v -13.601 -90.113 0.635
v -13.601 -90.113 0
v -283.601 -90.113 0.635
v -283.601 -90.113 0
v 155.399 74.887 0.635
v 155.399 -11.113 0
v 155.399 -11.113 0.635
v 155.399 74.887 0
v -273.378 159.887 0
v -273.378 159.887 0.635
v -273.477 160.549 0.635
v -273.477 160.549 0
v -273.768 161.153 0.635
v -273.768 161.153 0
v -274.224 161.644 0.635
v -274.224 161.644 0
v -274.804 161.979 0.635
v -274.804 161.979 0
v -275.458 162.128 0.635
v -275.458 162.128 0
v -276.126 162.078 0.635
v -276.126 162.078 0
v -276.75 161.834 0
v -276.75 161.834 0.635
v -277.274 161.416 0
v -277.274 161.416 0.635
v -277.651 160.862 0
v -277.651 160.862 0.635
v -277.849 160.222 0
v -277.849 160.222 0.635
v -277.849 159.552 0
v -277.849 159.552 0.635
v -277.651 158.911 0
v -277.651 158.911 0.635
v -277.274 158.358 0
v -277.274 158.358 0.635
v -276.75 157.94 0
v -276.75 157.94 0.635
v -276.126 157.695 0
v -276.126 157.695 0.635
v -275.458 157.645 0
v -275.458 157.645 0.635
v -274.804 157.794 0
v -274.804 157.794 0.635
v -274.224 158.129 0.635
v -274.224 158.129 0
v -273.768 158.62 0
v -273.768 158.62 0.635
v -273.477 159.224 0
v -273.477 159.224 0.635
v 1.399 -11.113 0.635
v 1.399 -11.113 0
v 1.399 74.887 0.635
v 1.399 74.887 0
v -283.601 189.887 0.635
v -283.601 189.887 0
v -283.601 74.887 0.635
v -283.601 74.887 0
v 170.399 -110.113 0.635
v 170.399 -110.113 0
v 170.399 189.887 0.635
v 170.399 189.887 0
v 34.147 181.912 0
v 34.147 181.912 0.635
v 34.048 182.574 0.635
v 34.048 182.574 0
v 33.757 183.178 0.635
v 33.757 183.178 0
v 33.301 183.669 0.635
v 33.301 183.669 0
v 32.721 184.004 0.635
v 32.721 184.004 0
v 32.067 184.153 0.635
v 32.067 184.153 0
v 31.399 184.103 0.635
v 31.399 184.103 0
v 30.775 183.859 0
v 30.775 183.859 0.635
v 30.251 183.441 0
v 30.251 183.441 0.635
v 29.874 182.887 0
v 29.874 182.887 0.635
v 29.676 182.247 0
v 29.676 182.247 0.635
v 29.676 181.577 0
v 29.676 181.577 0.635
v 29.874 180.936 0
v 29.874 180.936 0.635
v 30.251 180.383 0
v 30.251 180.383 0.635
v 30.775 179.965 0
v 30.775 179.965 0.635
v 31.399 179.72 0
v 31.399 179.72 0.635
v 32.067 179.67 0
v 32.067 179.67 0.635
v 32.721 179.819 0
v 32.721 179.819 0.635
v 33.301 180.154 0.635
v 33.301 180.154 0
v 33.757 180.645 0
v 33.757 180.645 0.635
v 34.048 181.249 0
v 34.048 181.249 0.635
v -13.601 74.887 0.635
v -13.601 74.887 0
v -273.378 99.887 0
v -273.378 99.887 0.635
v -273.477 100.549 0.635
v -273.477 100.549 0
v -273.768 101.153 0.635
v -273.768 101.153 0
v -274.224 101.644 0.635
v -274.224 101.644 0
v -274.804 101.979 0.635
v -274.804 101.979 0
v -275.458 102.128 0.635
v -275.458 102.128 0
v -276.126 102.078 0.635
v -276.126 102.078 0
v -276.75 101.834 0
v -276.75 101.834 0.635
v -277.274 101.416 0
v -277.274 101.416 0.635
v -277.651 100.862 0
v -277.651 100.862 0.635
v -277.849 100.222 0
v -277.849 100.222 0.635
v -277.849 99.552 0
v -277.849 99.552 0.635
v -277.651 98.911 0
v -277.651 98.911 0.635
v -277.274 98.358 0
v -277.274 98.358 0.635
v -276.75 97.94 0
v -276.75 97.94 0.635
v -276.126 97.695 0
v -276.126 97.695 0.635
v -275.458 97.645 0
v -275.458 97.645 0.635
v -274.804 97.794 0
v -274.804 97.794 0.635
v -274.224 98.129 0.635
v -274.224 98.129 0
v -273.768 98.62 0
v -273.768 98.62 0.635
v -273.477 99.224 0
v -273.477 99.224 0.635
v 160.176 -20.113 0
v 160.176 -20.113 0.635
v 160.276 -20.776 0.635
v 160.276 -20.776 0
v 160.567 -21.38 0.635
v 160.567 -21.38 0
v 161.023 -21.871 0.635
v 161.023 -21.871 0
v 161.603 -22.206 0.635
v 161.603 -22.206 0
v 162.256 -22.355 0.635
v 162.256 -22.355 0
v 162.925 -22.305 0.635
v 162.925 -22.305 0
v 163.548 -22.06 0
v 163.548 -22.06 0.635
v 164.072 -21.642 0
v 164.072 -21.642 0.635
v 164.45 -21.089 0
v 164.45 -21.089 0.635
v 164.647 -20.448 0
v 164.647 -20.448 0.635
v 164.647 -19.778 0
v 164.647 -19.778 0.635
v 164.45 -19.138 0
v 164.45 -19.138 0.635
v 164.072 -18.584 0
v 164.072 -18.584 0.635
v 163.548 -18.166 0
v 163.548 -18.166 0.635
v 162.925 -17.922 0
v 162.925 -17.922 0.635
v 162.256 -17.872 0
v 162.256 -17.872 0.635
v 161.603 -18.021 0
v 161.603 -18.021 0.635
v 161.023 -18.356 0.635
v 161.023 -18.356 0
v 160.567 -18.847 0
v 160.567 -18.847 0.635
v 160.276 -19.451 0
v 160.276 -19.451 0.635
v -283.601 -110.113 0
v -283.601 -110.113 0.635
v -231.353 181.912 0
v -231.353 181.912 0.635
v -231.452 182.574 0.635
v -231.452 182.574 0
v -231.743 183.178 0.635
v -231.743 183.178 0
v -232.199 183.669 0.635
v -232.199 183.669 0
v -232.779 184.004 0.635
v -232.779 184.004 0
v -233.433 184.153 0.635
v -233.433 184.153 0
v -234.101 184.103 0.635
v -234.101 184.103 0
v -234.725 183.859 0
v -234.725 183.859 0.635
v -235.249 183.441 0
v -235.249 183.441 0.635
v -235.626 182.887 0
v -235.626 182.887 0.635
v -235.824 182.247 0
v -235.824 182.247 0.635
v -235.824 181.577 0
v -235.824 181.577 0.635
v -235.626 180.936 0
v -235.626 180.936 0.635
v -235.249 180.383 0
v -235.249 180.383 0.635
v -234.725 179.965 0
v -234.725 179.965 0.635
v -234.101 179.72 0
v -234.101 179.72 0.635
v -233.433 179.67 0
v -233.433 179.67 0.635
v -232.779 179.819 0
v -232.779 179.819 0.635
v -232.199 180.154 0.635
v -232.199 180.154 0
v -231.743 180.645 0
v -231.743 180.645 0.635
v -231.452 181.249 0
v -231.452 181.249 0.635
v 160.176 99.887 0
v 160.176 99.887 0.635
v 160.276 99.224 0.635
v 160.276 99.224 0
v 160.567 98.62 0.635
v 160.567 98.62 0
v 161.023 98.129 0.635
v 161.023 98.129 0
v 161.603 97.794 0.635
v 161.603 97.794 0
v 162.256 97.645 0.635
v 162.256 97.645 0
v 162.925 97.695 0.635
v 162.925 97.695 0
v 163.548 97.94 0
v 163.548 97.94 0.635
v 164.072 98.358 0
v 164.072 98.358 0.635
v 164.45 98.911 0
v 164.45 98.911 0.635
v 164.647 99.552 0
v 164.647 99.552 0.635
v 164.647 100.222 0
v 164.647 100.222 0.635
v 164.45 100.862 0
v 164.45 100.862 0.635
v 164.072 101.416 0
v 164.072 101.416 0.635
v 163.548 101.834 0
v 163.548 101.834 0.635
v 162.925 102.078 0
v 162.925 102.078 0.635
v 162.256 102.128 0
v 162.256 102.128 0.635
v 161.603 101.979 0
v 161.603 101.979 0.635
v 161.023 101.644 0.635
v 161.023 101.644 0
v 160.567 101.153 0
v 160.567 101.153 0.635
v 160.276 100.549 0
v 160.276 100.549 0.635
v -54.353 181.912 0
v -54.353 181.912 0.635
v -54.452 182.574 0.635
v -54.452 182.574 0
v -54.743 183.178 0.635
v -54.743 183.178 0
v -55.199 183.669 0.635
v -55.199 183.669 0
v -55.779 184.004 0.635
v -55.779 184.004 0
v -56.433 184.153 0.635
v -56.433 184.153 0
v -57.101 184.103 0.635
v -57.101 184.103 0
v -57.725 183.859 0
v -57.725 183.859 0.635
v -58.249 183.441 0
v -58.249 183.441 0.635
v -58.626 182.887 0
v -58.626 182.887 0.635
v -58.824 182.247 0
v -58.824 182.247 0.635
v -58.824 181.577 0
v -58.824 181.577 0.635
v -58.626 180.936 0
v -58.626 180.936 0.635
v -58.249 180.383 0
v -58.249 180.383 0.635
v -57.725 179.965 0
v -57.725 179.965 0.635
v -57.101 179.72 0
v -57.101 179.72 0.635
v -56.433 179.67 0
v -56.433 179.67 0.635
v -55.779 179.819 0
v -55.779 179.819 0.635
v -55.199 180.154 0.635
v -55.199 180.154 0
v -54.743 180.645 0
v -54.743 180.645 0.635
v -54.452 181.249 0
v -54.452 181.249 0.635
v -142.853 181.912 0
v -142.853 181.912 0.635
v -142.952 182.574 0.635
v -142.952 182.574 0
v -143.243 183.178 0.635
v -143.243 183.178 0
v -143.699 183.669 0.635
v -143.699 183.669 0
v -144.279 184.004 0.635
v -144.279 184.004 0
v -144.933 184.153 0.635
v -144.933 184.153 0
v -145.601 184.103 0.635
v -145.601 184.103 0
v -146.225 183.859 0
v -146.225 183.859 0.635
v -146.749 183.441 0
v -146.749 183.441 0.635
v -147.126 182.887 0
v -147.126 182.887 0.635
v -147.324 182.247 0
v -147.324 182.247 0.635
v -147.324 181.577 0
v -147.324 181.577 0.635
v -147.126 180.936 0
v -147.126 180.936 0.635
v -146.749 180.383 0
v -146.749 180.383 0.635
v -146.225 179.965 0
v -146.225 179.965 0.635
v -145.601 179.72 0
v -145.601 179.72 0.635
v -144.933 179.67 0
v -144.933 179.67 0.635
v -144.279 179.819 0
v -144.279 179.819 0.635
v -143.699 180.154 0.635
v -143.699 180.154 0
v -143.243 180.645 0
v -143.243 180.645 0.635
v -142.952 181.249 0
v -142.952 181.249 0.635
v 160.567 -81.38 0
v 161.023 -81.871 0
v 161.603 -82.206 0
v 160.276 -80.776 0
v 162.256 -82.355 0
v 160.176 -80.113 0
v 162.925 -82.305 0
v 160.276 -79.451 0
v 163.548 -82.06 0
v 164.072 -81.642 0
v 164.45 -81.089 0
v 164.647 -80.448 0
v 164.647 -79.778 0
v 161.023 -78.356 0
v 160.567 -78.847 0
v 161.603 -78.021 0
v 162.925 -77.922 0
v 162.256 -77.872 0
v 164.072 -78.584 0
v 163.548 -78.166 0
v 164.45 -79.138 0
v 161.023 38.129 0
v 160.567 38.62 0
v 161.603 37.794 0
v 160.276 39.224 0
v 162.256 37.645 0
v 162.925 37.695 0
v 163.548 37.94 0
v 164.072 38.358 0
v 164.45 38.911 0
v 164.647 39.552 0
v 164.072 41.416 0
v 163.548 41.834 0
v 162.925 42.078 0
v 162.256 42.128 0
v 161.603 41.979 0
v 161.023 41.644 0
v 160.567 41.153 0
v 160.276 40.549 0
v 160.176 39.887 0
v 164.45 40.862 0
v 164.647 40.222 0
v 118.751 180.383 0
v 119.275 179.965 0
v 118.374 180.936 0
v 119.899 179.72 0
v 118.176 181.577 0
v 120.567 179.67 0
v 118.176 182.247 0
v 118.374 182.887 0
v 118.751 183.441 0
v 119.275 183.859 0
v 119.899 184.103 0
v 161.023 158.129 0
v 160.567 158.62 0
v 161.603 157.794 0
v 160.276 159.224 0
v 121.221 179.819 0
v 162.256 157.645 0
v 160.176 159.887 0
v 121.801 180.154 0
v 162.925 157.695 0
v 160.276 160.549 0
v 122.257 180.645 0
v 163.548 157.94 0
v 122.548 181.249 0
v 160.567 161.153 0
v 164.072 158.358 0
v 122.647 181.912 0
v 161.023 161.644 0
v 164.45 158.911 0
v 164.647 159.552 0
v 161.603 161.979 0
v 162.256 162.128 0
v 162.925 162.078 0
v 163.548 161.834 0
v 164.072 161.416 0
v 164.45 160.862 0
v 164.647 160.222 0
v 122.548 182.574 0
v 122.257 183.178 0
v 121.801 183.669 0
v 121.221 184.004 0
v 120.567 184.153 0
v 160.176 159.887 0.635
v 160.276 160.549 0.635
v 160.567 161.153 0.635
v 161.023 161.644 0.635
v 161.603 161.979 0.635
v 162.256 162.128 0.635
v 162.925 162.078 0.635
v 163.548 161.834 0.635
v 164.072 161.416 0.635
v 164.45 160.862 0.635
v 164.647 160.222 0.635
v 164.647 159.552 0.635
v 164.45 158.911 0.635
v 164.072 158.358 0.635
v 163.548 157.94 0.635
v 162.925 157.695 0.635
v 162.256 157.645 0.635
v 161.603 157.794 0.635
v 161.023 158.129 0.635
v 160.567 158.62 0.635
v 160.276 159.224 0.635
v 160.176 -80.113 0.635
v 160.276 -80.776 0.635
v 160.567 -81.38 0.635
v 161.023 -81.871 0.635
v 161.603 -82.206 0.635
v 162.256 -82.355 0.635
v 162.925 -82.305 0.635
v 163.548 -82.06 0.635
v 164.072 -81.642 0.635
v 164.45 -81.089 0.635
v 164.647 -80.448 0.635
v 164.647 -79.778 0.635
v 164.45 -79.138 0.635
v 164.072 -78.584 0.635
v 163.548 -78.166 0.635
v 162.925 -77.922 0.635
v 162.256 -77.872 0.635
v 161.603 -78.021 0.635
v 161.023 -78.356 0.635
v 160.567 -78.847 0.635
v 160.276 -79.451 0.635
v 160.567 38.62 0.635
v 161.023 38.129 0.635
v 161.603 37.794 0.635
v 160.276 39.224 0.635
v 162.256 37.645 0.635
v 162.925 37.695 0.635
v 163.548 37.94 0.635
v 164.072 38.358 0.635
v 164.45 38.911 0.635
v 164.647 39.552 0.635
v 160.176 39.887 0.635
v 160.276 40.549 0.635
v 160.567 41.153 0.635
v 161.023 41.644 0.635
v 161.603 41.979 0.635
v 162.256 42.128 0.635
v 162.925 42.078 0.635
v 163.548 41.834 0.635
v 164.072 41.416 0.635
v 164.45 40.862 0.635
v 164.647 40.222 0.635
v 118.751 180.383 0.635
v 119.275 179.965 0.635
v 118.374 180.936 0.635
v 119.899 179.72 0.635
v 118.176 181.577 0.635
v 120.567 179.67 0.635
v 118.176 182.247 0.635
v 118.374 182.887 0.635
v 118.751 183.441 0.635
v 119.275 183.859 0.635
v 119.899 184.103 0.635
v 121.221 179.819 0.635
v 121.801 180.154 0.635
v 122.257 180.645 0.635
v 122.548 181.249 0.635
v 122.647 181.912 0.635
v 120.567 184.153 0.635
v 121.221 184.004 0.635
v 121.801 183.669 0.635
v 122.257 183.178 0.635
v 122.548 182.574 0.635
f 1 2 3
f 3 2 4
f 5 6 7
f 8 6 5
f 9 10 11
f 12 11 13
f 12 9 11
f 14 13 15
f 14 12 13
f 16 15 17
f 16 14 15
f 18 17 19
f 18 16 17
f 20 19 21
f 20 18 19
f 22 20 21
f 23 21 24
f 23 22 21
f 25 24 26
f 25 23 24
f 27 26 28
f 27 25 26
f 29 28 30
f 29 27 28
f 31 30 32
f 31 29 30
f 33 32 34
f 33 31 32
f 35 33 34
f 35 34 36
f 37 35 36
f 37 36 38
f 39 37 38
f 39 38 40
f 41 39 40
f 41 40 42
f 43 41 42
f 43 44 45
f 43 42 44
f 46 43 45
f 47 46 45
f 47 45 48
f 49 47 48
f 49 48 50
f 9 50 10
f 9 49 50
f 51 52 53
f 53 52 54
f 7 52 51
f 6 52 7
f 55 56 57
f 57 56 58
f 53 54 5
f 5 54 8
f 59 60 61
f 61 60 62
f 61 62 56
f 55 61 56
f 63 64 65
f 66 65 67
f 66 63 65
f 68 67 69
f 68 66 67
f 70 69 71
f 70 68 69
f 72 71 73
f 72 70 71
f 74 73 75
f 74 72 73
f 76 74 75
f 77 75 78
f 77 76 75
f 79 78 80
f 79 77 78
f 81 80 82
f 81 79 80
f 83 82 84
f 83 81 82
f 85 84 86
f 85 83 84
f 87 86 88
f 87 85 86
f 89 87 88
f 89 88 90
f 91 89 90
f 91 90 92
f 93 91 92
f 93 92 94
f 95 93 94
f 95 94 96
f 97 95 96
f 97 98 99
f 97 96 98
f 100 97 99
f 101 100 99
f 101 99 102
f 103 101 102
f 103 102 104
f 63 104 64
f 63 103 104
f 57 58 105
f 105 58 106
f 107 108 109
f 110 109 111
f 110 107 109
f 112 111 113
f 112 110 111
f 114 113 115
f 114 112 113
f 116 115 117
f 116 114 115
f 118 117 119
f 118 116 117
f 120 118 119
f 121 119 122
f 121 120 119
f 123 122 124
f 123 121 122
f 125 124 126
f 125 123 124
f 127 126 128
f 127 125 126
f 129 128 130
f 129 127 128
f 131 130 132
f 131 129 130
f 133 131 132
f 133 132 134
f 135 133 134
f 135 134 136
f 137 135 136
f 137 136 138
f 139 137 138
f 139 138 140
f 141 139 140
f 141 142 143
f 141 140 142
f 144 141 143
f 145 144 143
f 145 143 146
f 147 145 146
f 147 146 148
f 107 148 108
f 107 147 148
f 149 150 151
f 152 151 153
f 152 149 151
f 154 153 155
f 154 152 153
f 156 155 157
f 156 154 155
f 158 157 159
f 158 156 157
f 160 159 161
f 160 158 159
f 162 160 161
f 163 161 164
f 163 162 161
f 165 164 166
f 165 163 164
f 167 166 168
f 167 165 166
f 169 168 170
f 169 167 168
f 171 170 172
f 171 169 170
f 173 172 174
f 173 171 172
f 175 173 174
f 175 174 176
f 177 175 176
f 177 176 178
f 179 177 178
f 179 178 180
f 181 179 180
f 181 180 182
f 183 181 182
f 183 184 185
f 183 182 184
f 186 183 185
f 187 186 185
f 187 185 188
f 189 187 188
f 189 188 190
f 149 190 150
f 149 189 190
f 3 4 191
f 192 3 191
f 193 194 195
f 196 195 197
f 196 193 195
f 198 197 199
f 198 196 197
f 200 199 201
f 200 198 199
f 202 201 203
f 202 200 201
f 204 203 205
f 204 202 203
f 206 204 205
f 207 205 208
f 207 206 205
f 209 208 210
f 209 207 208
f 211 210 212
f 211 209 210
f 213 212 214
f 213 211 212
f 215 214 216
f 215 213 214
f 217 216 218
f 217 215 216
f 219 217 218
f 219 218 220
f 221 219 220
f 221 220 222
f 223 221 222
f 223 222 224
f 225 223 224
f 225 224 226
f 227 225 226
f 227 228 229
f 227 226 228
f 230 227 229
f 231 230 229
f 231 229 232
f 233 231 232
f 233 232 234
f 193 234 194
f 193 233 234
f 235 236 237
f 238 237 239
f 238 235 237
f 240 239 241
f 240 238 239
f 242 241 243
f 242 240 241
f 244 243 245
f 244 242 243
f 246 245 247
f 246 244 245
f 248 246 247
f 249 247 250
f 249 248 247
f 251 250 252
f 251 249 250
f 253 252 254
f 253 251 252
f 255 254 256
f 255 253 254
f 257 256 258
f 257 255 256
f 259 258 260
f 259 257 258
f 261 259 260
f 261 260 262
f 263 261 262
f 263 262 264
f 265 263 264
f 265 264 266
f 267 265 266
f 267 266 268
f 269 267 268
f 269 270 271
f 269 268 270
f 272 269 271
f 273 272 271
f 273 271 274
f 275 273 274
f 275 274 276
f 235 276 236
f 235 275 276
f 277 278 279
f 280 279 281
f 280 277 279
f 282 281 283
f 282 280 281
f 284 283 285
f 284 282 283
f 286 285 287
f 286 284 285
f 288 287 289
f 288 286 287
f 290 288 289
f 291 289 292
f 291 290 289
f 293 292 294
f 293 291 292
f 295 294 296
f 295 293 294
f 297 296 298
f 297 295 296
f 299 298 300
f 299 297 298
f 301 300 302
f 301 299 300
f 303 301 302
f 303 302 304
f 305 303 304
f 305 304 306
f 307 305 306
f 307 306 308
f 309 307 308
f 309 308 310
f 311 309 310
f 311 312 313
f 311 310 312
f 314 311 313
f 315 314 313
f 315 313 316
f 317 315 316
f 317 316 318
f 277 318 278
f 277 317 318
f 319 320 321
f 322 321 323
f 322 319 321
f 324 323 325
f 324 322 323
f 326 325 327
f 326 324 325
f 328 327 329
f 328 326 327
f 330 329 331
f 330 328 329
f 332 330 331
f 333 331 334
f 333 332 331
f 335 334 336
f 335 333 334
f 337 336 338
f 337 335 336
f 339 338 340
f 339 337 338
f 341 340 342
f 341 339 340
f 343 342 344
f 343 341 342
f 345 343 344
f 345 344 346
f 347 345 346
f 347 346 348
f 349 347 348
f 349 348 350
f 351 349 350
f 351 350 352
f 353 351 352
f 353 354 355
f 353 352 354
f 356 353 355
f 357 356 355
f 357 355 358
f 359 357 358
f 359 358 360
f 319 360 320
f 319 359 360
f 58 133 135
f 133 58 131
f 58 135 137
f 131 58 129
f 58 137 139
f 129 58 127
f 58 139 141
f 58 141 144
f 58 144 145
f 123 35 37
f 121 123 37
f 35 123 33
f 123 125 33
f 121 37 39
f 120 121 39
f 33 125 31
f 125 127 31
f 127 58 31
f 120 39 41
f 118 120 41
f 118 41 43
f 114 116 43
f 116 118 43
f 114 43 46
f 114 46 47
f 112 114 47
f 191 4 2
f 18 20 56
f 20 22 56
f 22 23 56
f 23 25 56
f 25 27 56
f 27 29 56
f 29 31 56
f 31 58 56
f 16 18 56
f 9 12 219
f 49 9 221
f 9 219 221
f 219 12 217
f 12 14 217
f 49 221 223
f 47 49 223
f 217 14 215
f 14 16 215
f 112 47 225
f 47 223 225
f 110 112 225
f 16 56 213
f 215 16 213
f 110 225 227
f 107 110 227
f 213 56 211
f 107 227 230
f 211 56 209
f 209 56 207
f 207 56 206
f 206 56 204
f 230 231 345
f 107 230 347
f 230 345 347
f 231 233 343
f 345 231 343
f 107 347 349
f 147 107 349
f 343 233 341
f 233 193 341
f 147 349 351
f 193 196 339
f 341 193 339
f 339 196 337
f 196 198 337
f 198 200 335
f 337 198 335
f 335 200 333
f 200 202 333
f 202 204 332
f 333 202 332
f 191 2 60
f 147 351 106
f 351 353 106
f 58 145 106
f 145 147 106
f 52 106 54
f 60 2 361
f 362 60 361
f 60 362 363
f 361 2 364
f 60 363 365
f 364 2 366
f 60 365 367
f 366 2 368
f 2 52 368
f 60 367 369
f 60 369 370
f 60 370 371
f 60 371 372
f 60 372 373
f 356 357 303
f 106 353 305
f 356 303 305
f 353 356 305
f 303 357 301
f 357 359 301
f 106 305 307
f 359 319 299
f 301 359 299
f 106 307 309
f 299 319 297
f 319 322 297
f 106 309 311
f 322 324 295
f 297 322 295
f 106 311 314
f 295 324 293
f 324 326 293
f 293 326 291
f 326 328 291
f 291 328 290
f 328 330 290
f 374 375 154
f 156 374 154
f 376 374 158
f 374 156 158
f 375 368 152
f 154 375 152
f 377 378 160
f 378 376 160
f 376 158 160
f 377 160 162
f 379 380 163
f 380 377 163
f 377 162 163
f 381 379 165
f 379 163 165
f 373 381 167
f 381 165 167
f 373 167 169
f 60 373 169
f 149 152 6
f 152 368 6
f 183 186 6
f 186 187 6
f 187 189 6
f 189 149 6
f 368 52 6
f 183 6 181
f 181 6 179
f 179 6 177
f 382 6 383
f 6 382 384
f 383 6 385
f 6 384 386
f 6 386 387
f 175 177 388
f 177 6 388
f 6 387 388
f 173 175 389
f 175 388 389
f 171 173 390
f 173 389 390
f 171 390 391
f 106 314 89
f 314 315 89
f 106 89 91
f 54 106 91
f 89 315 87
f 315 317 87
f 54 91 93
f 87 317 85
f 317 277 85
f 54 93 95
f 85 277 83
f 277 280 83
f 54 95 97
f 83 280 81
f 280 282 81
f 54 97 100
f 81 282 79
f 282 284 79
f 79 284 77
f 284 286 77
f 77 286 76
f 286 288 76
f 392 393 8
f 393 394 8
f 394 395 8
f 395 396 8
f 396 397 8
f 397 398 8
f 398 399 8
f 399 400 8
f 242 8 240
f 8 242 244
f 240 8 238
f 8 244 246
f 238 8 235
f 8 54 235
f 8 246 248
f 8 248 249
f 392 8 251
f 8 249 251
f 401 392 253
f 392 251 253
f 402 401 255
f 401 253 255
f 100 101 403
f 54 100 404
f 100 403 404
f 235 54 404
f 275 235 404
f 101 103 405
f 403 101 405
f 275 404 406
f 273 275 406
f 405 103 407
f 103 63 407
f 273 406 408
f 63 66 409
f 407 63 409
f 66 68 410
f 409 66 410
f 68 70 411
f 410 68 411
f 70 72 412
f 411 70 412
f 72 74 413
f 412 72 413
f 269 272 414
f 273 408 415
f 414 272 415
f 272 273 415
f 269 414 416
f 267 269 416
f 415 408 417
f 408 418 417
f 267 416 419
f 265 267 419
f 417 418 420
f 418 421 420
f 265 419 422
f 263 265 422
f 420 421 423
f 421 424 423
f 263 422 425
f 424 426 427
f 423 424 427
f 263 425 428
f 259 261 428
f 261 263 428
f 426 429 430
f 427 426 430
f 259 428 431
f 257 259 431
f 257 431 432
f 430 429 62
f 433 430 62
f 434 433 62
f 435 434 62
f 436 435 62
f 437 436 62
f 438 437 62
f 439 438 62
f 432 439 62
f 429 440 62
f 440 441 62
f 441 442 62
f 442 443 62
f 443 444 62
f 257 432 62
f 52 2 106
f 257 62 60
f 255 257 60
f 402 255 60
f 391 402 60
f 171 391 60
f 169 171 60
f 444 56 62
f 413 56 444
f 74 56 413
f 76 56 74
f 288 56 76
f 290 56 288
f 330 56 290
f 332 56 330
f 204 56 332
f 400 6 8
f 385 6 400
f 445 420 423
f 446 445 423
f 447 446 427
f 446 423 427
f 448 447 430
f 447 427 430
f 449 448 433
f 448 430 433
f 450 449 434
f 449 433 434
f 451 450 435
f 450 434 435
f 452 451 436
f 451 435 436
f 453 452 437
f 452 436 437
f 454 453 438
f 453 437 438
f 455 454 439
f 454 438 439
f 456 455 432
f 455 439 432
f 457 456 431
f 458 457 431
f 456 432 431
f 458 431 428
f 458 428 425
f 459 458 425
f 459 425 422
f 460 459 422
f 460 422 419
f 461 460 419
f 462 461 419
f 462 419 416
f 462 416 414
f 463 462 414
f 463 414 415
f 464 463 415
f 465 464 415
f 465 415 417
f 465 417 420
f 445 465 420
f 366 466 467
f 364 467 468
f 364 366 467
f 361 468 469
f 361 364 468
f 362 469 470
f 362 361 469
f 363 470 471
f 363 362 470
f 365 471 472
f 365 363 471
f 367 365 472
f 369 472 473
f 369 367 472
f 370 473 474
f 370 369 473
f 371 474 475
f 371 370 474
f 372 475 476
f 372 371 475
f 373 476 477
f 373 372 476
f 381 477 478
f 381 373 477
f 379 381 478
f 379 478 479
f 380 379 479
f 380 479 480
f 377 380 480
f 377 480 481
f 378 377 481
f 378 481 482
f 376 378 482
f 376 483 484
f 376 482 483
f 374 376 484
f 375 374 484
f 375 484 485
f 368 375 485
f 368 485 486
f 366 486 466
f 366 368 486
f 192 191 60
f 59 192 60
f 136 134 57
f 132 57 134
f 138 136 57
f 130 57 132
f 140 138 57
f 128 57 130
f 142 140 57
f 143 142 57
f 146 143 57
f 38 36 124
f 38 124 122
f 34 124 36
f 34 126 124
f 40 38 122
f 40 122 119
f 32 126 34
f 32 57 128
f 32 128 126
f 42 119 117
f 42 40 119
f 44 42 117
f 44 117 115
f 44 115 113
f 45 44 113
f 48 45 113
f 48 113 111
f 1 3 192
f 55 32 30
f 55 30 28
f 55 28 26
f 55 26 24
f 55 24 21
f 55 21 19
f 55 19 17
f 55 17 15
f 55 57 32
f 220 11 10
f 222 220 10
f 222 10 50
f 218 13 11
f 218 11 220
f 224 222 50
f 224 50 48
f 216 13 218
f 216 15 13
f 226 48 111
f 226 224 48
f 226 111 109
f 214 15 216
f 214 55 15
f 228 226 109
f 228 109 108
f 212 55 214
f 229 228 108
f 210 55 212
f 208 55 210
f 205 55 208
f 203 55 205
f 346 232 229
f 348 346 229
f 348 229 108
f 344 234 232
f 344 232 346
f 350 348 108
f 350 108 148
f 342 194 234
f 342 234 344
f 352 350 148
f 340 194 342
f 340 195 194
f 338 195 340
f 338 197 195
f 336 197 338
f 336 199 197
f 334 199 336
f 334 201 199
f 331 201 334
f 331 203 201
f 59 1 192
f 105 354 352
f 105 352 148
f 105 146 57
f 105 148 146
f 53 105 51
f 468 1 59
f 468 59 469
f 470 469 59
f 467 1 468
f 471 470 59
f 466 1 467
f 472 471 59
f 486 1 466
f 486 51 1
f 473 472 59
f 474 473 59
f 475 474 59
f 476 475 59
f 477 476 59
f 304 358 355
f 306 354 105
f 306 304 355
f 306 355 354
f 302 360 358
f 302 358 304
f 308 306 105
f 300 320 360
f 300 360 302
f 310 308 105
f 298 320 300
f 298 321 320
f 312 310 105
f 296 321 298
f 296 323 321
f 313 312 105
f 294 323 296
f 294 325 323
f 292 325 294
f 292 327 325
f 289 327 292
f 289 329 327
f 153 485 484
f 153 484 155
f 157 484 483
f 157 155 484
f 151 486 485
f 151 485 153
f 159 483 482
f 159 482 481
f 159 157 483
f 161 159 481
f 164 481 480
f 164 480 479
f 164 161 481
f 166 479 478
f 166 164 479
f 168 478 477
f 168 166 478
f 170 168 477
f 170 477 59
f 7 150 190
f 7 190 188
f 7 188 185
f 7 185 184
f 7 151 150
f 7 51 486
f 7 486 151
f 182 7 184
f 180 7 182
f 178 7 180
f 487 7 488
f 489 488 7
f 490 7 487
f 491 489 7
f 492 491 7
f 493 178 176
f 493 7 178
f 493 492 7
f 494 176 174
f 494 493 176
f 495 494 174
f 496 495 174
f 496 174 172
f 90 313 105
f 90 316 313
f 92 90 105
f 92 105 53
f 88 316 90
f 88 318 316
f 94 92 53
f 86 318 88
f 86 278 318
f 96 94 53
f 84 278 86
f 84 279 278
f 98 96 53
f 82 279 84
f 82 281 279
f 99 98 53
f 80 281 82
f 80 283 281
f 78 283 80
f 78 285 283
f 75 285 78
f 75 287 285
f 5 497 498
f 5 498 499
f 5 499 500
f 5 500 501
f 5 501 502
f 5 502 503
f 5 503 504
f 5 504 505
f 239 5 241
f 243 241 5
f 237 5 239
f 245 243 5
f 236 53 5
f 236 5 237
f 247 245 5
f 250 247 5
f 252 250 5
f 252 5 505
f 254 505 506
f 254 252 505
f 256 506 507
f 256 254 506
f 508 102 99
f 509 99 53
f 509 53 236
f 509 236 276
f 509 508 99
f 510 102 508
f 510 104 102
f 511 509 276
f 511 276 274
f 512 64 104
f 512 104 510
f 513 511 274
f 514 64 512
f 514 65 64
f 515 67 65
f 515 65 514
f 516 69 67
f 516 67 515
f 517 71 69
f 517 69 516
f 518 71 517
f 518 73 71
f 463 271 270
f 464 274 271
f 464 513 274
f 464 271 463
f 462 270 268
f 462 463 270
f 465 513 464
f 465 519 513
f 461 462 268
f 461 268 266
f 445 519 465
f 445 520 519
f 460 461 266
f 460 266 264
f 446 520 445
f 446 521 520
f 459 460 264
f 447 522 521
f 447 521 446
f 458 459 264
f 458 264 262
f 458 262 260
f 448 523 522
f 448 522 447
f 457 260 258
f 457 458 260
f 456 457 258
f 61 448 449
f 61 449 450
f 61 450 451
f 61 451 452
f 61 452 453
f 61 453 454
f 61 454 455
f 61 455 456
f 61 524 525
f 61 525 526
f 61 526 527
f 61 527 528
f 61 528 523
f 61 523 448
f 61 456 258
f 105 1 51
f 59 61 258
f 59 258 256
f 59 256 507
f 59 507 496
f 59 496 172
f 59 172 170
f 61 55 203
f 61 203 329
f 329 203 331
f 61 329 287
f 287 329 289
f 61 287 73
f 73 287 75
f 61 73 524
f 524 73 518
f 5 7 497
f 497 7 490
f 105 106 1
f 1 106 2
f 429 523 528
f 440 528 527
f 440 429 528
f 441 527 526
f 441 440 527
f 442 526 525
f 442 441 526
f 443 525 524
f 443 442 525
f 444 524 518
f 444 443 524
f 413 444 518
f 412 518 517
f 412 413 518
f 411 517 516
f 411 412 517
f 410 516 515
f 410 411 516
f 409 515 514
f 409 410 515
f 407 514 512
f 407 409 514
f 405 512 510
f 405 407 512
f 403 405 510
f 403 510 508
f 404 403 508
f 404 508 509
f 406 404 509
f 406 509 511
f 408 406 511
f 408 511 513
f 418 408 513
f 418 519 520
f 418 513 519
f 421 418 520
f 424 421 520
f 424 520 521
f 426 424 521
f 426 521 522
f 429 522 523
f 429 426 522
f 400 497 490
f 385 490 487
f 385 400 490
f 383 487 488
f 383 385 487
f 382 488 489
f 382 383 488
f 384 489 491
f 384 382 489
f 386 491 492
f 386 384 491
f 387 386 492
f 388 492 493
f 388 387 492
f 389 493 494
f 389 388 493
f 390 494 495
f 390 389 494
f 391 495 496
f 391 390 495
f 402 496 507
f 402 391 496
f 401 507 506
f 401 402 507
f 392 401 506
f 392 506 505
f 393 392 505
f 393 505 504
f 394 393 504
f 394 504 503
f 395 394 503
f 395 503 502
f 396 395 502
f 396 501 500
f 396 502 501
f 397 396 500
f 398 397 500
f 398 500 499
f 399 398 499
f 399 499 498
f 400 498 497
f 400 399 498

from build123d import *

# Parameters (mm, degrees)
SKETCH1_W               = 154
SKETCH1_H               = 86
BOSS_EXTRUDE1_DEPTH     = 0.635
SKETCH2_R               = 2.248
CUT_EXTRUDE3_DEPTH      = 342.301440511
LPATTERN1_COUNT         = 5
LPATTERN1_PITCH         = 88.5
SKETCH3_R               = 2.248
CUT_EXTRUDE5_DEPTH      = 342.301440511
LPATTERN2_COUNT         = 6
LPATTERN2_PITCH         = 60
MIRROR1_COPY_1_SKETCH_R = 2.248
MIRROR1_COPY_1_DEPTH    = 342.301440511
MIRROR1_COPY_2_SKETCH_R = 2.248
MIRROR1_COPY_2_DEPTH    = 342.301440511
MIRROR1_COPY_3_SKETCH_R = 2.248
MIRROR1_COPY_3_DEPTH    = 342.301440511
MIRROR1_COPY_4_SKETCH_R = 2.248
MIRROR1_COPY_4_DEPTH    = 342.301440511
MIRROR1_COPY_5_SKETCH_R = 2.248
MIRROR1_COPY_5_DEPTH    = 342.301440511
MIRROR1_COPY_6_SKETCH_R = 2.248
MIRROR1_COPY_6_DEPTH    = 342.301440511


with BuildPart() as part:
    # Sketch1 → Boss-Extrude1 (new body)
    with BuildSketch(Plane.XY):
        Polygon((-283.600620106, 189.886698706), (-283.600620106, 74.886698706), (-13.600620106, 74.886698706), (-13.600620106, -90.113301294), (-283.600620106, -90.113301294), (-283.600620106, -110.113301294), (170.399379894, -110.113301294), (170.399379894, 189.886698706), align=None)
        with Locations((78.399379894, 31.886698706)):
            Rectangle(SKETCH1_W, SKETCH1_H, mode=Mode.SUBTRACT)
    extrude(amount=BOSS_EXTRUDE1_DEPTH)

    # Sketch2 → Cut-Extrude3 (cut, through all)
    with BuildSketch(Plane.XY):
        with Locations((-233.600620106, 181.911698706)):
            Circle(SKETCH2_R)
    cut_extrude3 = extrude(amount=CUT_EXTRUDE3_DEPTH, mode=Mode.SUBTRACT)

    # LPattern1: Cut-Extrude3 ×5
    with Locations(*[(i * LPATTERN1_PITCH, 0, 0) for i in range(1, LPATTERN1_COUNT)]):
        add(cut_extrude3, mode=Mode.SUBTRACT)

    # Sketch3 → Cut-Extrude5 (cut, through all)
    with BuildSketch(Plane.XY):
        with Locations((-275.625620106, 159.886698706)):
            Circle(SKETCH3_R)
    cut_extrude5 = extrude(amount=CUT_EXTRUDE5_DEPTH, mode=Mode.SUBTRACT)

    # LPattern2: Cut-Extrude5 ×6
    with Locations(*[(0, -i * LPATTERN2_PITCH, 0) for i in range(1, LPATTERN2_COUNT)]):
        add(cut_extrude5, mode=Mode.SUBTRACT)

    # Mirror1 copy 1 sketch → Mirror1 copy 1 (cut, through all)
    with BuildSketch(Plane(origin=(-113.201240213, -60, 0), x_dir=(-1, 0, 0), z_dir=(0, 0, 1))):
        with Locations((-275.625620106, -159.886698706)):
            Circle(MIRROR1_COPY_1_SKETCH_R)
    extrude(amount=MIRROR1_COPY_1_DEPTH, mode=Mode.SUBTRACT)

    # Mirror1 copy 2 sketch → Mirror1 copy 2 (cut, through all)
    with BuildSketch(Plane(origin=(-113.201240213, -120, 0), x_dir=(-1, 0, 0), z_dir=(0, 0, 1))):
        with Locations((-275.625620106, -159.886698706)):
            Circle(MIRROR1_COPY_2_SKETCH_R)
    extrude(amount=MIRROR1_COPY_2_DEPTH, mode=Mode.SUBTRACT)

    # Mirror1 copy 3 sketch → Mirror1 copy 3 (cut, through all)
    with BuildSketch(Plane(origin=(-113.201240213, -180, 0), x_dir=(-1, 0, 0), z_dir=(0, 0, 1))):
        with Locations((-275.625620106, -159.886698706)):
            Circle(MIRROR1_COPY_3_SKETCH_R)
    extrude(amount=MIRROR1_COPY_3_DEPTH, mode=Mode.SUBTRACT)

    # Mirror1 copy 4 sketch → Mirror1 copy 4 (cut, through all)
    with BuildSketch(Plane(origin=(-113.201240213, -240, 0), x_dir=(-1, 0, 0), z_dir=(0, 0, 1))):
        with Locations((-275.625620106, -159.886698706)):
            Circle(MIRROR1_COPY_4_SKETCH_R)
    extrude(amount=MIRROR1_COPY_4_DEPTH, mode=Mode.SUBTRACT)

    # Mirror1 copy 5 sketch → Mirror1 copy 5 (cut, through all)
    with BuildSketch(Plane(origin=(-113.201240213, -300, 0), x_dir=(-1, 0, 0), z_dir=(0, 0, 1))):
        with Locations((-275.625620106, -159.886698706)):
            Circle(MIRROR1_COPY_5_SKETCH_R)
    extrude(amount=MIRROR1_COPY_5_DEPTH, mode=Mode.SUBTRACT)

    # Mirror1 copy 6 sketch → Mirror1 copy 6 (cut, through all)
    with BuildSketch(Plane(origin=(-113.201240213, 0, 0), x_dir=(-1, 0, 0), z_dir=(0, 0, 1))):
        with Locations((-275.625620106, -159.886698706)):
            Circle(MIRROR1_COPY_6_SKETCH_R)
    extrude(amount=MIRROR1_COPY_6_DEPTH, mode=Mode.SUBTRACT)


solid = part.part
